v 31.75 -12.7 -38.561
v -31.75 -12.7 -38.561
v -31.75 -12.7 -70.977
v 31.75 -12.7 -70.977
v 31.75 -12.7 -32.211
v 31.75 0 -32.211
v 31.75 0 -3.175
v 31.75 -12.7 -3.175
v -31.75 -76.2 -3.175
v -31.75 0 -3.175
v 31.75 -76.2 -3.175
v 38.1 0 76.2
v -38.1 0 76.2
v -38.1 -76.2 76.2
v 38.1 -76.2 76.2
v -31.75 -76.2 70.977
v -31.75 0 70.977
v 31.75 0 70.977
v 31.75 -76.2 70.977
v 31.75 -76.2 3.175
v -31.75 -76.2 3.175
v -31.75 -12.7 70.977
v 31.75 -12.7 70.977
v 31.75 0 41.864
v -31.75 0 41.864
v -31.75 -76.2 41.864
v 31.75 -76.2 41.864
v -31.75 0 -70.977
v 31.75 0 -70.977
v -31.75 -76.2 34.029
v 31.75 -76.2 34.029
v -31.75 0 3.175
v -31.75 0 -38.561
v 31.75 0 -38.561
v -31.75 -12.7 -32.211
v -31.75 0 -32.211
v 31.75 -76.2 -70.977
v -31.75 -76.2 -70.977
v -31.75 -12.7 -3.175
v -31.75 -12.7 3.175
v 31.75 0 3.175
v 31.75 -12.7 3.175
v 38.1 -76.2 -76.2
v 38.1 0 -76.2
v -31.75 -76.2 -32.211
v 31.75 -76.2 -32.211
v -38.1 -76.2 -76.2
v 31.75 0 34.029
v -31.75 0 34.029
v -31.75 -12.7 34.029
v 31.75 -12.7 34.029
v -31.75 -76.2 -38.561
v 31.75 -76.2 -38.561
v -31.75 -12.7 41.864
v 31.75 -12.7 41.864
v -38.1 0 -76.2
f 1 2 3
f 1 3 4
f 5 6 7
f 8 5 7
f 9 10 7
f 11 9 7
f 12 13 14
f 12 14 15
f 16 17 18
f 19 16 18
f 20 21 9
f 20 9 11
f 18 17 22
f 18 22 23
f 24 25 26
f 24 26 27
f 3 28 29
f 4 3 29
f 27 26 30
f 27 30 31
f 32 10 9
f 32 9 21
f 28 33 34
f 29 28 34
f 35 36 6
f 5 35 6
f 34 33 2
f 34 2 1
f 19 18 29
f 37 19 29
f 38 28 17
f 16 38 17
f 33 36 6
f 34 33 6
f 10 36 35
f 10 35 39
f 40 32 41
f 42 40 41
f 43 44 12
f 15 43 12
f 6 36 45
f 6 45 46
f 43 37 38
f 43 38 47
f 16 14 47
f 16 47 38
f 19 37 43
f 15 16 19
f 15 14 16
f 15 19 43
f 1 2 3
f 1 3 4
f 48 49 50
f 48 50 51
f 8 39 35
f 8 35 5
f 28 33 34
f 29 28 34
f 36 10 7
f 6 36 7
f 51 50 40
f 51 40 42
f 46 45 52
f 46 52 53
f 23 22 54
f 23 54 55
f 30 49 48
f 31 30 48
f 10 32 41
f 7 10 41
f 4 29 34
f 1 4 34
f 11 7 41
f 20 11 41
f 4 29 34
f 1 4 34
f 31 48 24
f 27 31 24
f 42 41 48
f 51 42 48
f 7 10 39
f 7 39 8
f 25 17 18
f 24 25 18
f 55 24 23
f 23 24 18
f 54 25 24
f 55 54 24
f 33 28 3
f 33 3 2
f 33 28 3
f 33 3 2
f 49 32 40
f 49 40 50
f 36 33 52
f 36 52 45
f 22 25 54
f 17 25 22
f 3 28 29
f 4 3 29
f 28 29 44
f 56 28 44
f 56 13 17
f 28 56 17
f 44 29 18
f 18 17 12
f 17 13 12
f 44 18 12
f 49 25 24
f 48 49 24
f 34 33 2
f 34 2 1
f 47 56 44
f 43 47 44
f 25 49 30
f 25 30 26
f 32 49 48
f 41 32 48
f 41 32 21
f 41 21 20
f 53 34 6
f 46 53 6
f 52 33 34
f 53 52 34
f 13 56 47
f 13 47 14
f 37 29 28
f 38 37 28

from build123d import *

# Parameters (mm, degrees)
F0_W     = 76.2
F0_H     = 152.4
F1_DEPTH = 76.2
F0_W_2   = 63.5
F0_H_2   = 29.112704
F2_DEPTH = 12.7
F0_H_3   = 6.35
F3_DEPTH = 76.2
F0_H_4   = 32.415725
F4_DEPTH = 12.7
F0_H_5   = 7.835079
F5_DEPTH = 76.2
F0_H_6   = 30.853832
F6_DEPTH = 12.7
F0_H_7   = 29.03589
F7_DEPTH = 12.7


with BuildPart() as f1:
    # F0 (on Front) → F1 (new body)
    with BuildSketch(Plane.XZ):
        Rectangle(F0_W, F0_H)
        Polygon((-31.75, 70.976615), (31.75, 70.976615), (31.75, 41.863911), (31.75, 34.028832), (31.75, 3.175), (31.75, -3.175), (31.75, -32.21089), (31.75, -38.56089), (31.75, -70.976615), (-31.75, -70.976615), (-31.75, -38.56089), (-31.75, -32.21089), (-31.75, -3.175), (-31.75, 3.175), (-31.75, 34.028832), (-31.75, 41.863911), align=None, mode=Mode.SUBTRACT)
    extrude(amount=F1_DEPTH)


with BuildPart() as f2:
    # F0 (on Front) → F2 (new body)
    with BuildSketch(Plane.XZ):
        with Locations((0, 56.420263)):
            Rectangle(F0_W_2, F0_H_2)
    extrude(amount=F2_DEPTH)


with BuildPart() as f3:
    # F0 (on Front) → F3 (new body)
    with BuildSketch(Plane.XZ):
        Rectangle(F0_W_2, F0_H_3)
    extrude(amount=F3_DEPTH)


with BuildPart() as f4:
    # F0 (on Front) → F4 (new body)
    with BuildSketch(Plane.XZ):
        with Locations((0, -54.768752)):
            Rectangle(F0_W_2, F0_H_4)
    extrude(amount=F4_DEPTH)


with BuildPart() as f5:
    # F0 (on Front) → F5 (new body)
    with BuildSketch(Plane.XZ):
        with Locations((0, -35.38589)):
            Rectangle(F0_W_2, F0_H_3)
        with Locations((0, 37.946371)):
            Rectangle(F0_W_2, F0_H_5)
    extrude(amount=F5_DEPTH)


with BuildPart() as f6:
    # F0 (on Front) → F6 (new body)
    with BuildSketch(Plane.XZ):
        with Locations((0, 18.601916)):
            Rectangle(F0_W_2, F0_H_6)
        with Locations((0, -54.768752)):
            Rectangle(F0_W_2, F0_H_4)
    extrude(amount=F6_DEPTH)


with BuildPart() as f7:
    # F0 (on Front) → F7 (new body)
    with BuildSketch(Plane.XZ):
        with Locations((0, -17.692945)):
            Rectangle(F0_W_2, F0_H_7)
    extrude(amount=F7_DEPTH)


solid = Compound([f1.part, f2.part, f3.part, f4.part, f5.part, f6.part, f7.part])
